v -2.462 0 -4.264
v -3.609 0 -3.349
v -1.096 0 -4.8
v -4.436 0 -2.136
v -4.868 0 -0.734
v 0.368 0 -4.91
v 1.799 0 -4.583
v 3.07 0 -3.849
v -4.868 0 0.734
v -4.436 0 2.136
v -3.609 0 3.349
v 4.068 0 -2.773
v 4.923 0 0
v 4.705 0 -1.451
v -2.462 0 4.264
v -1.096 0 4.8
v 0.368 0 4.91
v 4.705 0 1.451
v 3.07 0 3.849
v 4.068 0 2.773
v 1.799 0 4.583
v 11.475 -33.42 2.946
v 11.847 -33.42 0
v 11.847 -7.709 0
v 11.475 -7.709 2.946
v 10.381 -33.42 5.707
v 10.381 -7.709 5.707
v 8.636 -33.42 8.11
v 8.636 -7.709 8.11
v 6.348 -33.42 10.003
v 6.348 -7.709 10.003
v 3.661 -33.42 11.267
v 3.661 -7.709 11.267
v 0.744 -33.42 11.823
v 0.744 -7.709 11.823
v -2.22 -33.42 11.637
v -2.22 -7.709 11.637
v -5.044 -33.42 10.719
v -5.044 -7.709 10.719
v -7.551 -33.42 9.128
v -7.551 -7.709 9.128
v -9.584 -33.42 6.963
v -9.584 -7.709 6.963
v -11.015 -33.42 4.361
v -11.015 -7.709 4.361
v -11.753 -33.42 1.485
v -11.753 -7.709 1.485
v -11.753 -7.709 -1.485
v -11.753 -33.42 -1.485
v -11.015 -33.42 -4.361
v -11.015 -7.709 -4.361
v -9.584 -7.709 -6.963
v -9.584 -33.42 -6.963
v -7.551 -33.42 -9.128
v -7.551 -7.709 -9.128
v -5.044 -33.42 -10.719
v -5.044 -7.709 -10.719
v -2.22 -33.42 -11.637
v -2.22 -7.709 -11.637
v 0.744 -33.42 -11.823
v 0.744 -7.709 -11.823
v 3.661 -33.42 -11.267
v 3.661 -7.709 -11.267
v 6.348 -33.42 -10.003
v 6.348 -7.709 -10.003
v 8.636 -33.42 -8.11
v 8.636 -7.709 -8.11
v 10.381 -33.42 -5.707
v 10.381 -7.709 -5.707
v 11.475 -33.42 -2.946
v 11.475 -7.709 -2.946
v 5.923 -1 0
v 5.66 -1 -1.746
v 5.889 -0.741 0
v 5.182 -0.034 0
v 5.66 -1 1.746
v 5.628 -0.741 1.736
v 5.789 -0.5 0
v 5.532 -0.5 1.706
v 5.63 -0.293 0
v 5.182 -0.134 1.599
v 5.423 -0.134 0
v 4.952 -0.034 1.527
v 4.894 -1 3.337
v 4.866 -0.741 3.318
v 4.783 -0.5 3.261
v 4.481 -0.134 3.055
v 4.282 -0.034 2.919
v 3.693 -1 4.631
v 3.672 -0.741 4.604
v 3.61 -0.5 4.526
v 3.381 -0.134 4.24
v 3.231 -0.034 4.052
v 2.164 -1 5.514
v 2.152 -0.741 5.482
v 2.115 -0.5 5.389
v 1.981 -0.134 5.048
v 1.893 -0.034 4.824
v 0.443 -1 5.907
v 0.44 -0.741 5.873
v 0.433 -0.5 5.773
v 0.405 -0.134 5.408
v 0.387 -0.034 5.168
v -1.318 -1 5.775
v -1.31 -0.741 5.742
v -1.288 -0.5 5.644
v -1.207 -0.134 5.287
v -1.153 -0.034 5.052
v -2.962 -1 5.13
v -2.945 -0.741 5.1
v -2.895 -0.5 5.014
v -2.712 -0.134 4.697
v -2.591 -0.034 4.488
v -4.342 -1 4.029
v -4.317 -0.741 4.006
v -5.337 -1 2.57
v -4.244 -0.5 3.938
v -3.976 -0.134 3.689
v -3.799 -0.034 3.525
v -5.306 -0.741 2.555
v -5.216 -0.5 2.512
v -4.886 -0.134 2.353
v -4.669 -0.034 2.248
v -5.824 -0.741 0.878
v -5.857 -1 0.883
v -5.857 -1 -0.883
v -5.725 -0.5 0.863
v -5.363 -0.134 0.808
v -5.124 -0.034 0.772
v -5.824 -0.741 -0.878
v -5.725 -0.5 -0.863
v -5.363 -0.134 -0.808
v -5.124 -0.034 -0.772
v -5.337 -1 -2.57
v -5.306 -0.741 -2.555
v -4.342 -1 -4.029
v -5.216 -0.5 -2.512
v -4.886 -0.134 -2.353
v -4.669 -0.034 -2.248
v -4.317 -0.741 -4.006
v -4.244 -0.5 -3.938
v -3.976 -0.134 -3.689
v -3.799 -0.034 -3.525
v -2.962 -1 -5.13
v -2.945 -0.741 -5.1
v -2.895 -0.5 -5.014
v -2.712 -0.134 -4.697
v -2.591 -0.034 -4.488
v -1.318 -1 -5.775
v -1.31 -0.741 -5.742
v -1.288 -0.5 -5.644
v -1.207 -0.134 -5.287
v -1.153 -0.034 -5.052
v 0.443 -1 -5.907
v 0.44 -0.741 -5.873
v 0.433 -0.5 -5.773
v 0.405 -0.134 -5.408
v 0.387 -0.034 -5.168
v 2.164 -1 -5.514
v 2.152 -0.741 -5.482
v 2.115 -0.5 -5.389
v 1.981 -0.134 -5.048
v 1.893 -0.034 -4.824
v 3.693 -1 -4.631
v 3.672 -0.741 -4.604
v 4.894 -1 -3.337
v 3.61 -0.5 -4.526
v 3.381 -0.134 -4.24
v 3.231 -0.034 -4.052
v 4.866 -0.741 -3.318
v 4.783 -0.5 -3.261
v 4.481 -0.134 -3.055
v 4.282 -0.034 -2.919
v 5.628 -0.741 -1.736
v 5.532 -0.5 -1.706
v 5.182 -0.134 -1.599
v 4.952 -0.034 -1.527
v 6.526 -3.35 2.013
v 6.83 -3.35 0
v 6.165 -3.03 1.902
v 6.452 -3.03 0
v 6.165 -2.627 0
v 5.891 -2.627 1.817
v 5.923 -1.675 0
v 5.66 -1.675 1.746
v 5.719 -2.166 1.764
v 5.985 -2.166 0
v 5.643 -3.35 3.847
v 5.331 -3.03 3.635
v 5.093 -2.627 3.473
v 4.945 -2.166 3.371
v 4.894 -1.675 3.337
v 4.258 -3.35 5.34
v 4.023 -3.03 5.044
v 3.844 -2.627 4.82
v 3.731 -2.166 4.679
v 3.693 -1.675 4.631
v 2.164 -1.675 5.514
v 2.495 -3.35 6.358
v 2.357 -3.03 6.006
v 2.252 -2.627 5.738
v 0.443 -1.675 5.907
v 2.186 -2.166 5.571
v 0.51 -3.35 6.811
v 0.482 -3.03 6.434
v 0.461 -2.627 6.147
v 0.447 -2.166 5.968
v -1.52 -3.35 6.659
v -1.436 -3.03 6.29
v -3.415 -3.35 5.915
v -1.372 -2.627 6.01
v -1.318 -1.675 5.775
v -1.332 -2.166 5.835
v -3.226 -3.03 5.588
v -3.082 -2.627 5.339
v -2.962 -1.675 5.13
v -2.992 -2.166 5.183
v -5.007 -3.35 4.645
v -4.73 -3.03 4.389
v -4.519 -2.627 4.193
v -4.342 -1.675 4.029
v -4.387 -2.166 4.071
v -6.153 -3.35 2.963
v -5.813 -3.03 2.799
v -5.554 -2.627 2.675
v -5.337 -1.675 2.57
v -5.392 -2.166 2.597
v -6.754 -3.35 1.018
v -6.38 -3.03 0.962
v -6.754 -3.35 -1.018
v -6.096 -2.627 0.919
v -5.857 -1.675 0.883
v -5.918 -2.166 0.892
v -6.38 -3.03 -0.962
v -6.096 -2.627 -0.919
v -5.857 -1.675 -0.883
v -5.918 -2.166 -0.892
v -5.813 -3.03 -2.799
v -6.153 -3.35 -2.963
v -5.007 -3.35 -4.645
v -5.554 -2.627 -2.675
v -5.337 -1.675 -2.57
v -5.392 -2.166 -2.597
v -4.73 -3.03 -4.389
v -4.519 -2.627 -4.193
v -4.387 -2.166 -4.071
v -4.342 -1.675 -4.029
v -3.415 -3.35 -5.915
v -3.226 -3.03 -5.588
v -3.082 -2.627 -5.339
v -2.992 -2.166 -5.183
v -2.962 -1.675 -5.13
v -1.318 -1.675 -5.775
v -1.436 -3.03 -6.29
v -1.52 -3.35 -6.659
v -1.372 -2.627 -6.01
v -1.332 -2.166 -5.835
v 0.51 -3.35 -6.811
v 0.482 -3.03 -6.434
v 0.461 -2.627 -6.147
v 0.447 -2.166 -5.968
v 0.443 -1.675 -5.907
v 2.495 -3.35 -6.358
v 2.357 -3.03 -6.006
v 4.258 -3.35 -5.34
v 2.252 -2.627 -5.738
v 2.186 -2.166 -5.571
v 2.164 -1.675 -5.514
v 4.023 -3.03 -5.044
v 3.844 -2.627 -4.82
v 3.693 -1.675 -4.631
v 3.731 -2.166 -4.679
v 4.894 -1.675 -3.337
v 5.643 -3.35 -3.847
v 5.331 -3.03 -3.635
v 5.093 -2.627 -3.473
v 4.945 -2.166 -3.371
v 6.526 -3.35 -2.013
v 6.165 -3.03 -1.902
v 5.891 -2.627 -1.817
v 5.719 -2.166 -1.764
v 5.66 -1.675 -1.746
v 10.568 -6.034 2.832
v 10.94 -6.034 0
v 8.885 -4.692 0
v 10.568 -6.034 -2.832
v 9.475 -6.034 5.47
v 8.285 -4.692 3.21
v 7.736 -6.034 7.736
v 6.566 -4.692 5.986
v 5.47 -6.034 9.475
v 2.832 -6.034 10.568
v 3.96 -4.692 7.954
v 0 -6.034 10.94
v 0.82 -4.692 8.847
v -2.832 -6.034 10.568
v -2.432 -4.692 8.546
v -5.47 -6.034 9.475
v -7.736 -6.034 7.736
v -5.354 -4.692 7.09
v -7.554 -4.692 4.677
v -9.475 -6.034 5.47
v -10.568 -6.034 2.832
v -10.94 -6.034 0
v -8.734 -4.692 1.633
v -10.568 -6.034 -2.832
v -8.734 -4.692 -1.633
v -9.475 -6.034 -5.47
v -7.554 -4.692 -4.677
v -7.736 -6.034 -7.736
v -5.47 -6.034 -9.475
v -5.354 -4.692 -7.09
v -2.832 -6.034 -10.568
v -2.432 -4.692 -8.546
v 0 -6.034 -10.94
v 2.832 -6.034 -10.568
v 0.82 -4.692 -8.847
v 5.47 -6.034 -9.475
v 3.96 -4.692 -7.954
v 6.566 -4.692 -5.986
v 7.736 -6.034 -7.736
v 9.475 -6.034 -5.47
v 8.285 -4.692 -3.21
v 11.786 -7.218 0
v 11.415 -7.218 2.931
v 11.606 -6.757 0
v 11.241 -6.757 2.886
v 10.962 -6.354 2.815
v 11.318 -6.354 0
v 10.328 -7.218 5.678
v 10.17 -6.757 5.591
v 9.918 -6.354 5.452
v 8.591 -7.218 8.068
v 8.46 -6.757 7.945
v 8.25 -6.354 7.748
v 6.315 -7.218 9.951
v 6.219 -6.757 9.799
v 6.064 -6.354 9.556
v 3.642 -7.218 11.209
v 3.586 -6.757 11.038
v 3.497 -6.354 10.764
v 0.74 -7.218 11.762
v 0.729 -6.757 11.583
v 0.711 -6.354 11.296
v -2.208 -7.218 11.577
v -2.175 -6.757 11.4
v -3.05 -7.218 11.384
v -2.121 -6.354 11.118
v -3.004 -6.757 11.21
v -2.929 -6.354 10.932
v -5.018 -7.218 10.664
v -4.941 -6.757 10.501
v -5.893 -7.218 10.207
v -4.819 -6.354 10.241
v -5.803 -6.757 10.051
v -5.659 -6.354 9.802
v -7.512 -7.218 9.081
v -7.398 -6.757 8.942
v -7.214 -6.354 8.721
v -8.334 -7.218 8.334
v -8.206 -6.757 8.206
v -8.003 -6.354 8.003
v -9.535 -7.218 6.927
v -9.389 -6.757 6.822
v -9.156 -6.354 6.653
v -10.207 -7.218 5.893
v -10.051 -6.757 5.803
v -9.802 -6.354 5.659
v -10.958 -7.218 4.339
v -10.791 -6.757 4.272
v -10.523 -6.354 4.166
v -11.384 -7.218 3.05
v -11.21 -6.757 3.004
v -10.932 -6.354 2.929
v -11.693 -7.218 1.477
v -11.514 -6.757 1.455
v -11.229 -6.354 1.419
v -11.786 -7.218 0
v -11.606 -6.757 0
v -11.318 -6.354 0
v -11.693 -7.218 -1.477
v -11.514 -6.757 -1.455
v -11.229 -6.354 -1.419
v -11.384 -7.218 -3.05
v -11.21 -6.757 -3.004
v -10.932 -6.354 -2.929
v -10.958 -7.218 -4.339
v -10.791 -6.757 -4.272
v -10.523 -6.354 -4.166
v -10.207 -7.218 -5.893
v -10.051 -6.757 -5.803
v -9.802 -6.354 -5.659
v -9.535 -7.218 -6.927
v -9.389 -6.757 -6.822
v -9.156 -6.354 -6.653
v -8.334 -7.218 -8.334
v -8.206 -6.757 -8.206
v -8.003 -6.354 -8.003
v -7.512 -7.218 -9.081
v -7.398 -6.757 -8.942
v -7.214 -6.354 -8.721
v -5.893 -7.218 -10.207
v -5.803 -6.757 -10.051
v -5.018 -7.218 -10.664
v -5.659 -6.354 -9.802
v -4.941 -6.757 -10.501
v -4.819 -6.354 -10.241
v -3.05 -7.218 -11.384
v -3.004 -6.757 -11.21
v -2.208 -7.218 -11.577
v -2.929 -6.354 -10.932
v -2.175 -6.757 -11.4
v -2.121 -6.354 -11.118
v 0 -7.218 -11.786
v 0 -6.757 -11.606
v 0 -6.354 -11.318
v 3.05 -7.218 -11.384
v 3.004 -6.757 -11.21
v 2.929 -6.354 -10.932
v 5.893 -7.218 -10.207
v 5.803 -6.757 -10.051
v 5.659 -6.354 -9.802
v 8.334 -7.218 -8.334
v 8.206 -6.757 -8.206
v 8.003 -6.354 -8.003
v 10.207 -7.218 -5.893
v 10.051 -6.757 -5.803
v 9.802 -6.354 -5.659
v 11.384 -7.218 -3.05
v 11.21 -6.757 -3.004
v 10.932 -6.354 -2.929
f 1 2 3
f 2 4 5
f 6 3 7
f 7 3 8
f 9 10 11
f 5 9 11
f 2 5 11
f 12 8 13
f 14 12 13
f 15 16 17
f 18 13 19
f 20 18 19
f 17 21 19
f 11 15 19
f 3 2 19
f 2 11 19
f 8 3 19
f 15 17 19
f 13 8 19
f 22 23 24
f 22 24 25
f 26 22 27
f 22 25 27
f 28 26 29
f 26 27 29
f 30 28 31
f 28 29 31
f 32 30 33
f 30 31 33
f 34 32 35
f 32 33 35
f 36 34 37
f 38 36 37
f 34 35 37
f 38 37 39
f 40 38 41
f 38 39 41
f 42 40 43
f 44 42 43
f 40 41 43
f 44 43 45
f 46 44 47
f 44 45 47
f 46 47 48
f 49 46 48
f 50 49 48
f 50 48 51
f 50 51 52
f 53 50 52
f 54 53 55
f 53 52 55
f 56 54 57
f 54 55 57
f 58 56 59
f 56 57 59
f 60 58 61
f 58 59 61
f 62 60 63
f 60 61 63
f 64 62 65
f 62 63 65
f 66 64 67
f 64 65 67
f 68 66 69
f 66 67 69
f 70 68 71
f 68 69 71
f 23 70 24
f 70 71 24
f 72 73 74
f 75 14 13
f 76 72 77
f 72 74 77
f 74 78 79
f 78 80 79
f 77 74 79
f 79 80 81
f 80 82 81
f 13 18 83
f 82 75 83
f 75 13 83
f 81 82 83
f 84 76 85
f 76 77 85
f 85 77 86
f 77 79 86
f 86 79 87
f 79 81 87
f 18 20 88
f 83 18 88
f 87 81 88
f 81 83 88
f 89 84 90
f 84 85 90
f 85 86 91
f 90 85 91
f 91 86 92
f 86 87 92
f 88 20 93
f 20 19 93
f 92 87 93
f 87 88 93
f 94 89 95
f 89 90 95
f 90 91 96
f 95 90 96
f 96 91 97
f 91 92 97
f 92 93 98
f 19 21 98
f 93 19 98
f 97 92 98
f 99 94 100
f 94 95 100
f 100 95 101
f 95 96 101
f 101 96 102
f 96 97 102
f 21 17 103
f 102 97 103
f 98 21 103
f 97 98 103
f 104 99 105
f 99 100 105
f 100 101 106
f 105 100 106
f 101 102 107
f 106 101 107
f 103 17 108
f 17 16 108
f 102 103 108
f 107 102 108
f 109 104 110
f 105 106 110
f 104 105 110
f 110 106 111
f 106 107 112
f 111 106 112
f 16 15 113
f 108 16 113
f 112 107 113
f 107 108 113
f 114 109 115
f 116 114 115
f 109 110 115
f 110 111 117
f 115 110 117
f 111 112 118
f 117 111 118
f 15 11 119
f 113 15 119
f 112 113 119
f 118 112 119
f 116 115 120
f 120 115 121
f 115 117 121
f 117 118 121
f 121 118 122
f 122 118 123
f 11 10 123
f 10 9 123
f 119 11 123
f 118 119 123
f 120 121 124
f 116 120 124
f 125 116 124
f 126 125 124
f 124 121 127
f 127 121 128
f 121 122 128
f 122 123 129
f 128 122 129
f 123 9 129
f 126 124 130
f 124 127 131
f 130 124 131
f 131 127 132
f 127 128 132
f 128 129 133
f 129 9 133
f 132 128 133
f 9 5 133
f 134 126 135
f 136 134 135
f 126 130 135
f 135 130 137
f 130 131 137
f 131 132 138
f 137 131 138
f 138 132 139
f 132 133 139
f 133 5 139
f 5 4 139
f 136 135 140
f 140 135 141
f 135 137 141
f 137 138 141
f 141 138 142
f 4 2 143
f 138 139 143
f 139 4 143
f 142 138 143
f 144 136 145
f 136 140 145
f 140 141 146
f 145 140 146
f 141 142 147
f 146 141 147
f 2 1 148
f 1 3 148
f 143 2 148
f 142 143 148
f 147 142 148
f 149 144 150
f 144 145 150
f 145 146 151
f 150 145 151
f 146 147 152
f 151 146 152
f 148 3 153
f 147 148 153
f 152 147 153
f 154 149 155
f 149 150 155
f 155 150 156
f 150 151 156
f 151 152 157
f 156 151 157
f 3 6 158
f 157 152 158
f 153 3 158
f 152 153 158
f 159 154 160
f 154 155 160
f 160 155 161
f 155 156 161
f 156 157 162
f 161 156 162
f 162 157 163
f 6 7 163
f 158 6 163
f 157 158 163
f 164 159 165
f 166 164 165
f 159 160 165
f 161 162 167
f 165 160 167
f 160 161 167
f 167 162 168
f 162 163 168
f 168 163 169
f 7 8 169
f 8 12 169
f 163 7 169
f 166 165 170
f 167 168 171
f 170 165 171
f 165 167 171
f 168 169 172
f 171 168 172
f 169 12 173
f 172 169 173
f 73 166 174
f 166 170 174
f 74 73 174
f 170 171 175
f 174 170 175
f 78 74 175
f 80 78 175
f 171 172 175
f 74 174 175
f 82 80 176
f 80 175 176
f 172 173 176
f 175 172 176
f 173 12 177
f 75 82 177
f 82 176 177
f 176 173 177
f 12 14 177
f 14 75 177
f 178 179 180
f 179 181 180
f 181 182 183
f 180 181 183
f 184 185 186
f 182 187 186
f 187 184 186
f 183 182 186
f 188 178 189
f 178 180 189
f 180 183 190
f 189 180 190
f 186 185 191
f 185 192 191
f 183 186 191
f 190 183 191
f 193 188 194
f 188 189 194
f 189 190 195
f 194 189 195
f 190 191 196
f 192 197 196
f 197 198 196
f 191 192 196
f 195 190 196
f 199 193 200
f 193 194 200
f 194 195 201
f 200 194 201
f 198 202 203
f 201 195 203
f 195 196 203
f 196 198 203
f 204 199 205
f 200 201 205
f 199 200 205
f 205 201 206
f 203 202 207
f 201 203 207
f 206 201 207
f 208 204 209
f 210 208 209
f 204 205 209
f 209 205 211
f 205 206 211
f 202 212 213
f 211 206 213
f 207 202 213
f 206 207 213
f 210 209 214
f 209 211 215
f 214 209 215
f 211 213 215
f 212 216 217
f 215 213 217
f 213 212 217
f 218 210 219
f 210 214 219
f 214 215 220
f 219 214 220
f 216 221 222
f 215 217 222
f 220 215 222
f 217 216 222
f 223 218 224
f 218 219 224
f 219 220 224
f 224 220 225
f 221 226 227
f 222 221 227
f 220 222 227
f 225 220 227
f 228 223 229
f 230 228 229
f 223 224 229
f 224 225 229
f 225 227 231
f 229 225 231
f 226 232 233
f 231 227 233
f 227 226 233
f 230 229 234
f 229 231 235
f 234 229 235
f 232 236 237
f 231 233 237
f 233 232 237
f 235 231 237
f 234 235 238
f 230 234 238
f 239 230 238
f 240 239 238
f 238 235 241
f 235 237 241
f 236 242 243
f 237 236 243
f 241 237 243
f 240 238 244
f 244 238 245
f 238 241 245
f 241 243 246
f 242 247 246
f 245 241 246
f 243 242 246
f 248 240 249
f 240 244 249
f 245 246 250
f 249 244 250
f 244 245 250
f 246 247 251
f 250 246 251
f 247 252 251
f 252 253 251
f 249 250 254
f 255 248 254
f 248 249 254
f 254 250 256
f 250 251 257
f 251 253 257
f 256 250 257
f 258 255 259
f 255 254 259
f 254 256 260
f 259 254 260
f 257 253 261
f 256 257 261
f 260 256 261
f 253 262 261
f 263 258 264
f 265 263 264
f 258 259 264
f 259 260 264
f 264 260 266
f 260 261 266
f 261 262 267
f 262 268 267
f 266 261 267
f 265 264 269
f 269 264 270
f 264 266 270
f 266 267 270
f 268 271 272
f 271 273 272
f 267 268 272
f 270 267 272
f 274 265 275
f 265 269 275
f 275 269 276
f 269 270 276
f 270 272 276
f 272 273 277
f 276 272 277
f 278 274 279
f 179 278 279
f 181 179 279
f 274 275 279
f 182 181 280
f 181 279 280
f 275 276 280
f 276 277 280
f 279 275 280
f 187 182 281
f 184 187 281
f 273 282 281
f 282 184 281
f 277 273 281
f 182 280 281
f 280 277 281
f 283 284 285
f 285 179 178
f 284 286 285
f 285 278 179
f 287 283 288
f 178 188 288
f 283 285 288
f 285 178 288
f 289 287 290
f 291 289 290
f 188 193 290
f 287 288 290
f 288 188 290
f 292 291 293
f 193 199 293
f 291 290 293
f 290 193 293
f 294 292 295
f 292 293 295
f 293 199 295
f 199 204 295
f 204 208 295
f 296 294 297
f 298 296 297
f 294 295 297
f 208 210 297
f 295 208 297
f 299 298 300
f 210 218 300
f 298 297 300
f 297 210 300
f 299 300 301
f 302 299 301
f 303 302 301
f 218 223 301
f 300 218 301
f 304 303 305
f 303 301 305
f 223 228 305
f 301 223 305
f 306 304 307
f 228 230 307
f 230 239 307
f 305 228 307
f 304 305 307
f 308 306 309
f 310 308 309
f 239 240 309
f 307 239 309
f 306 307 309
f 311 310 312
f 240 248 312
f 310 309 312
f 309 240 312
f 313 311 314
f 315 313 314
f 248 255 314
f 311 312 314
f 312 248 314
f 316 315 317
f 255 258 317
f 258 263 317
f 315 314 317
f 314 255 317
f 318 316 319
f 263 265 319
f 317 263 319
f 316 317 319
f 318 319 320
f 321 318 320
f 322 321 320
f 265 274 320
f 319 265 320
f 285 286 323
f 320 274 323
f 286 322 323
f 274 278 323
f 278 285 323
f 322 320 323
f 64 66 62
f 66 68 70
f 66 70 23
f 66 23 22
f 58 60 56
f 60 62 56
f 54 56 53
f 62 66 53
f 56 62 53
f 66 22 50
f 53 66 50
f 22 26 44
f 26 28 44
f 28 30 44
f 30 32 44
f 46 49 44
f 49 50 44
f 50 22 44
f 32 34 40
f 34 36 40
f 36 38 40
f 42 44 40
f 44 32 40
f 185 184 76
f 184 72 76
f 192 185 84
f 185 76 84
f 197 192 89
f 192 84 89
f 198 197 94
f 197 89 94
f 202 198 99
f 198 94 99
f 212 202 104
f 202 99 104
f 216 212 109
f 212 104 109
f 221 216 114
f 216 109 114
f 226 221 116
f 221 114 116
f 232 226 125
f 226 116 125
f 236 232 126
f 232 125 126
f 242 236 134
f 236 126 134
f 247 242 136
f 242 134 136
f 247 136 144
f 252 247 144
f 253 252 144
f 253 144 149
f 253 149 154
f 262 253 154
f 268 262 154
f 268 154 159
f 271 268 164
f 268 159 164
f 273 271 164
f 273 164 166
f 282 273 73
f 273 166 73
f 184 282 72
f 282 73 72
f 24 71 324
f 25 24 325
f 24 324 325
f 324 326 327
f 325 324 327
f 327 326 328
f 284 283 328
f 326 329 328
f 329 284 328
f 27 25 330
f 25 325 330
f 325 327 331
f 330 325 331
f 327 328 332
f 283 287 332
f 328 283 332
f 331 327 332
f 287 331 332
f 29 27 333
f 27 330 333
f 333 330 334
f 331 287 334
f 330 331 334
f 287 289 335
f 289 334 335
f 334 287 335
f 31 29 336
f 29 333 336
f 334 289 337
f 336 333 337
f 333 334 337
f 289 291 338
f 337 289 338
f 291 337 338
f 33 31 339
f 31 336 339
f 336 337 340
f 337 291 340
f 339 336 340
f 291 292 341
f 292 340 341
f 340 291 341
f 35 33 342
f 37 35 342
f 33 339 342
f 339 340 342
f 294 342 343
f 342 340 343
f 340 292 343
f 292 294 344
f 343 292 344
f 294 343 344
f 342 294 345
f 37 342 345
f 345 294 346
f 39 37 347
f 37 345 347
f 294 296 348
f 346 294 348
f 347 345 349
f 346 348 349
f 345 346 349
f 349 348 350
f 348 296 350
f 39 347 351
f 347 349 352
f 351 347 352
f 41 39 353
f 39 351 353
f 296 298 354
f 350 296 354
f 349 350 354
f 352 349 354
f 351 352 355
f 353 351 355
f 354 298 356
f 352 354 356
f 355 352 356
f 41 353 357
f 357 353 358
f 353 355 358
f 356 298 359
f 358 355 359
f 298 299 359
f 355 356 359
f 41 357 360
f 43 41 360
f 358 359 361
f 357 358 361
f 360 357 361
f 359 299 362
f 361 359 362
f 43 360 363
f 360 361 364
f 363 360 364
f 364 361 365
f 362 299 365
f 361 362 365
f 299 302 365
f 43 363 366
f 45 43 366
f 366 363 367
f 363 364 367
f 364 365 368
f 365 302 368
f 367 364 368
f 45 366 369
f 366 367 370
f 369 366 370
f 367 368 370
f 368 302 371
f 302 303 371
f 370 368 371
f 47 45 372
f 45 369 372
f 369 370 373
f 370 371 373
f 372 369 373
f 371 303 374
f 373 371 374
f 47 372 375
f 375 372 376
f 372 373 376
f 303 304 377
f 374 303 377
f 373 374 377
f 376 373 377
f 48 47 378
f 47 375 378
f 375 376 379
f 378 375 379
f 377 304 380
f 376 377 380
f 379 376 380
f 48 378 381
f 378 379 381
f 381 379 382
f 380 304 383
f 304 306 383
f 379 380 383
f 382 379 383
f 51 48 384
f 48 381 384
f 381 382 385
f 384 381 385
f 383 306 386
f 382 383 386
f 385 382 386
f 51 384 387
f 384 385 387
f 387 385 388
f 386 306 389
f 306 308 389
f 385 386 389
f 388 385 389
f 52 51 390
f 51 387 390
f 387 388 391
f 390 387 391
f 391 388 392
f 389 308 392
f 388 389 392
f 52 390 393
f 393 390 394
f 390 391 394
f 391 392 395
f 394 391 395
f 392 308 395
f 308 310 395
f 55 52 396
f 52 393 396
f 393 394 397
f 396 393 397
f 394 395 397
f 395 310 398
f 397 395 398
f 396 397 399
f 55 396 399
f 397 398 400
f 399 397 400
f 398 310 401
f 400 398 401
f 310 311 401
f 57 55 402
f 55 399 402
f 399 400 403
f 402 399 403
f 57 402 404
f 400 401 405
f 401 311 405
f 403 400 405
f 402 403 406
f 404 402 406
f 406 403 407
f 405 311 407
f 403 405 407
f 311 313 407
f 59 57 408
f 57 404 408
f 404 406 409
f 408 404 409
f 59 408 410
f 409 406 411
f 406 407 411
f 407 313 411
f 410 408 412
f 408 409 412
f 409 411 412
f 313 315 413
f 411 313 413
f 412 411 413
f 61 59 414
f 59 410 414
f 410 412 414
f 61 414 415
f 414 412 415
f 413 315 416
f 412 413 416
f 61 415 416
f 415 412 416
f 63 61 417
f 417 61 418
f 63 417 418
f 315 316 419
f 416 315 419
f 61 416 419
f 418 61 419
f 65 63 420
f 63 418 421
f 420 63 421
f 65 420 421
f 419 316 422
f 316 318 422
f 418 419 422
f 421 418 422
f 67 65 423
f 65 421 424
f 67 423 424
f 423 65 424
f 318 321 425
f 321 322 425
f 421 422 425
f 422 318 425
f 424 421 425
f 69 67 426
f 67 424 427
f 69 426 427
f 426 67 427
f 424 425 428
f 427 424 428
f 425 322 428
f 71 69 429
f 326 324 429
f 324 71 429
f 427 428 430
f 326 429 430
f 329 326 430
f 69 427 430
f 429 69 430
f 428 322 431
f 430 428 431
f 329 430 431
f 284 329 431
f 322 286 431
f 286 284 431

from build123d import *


with BuildPart() as part:
    # Sketch1 → Revolve1 (revolve)
    with BuildSketch(Plane.XY):
        with BuildLine():
            Line((0, 0), (0, -33.42037452))
            Line((0, -33.42037452), (11.846734569, -33.42037452))
            Line((11.846734569, -33.42037452), (11.846734569, -7.708743439))
            ThreePointArc((11.846734569, -7.708743439), (11.605583733, -6.75666696), (10.940284949, -6.034184521))
            Line((10.940284949, -6.034184521), (6.829816905, -3.349893247))
            ThreePointArc((6.829816905, -3.349893247), (6.164518121, -2.627410808), (5.923367285, -1.67533433))
            Line((5.923367285, -1.67533433), (5.923367285, -1))
            ThreePointArc((5.923367285, -1), (5.630474066, -0.292893219), (4.923367285, 0))
            Line((4.923367285, 0), (0, 0))
        make_face()
    revolve(axis=Axis((0, 0, 0), (0, -1, 0)))


solid = part.part
